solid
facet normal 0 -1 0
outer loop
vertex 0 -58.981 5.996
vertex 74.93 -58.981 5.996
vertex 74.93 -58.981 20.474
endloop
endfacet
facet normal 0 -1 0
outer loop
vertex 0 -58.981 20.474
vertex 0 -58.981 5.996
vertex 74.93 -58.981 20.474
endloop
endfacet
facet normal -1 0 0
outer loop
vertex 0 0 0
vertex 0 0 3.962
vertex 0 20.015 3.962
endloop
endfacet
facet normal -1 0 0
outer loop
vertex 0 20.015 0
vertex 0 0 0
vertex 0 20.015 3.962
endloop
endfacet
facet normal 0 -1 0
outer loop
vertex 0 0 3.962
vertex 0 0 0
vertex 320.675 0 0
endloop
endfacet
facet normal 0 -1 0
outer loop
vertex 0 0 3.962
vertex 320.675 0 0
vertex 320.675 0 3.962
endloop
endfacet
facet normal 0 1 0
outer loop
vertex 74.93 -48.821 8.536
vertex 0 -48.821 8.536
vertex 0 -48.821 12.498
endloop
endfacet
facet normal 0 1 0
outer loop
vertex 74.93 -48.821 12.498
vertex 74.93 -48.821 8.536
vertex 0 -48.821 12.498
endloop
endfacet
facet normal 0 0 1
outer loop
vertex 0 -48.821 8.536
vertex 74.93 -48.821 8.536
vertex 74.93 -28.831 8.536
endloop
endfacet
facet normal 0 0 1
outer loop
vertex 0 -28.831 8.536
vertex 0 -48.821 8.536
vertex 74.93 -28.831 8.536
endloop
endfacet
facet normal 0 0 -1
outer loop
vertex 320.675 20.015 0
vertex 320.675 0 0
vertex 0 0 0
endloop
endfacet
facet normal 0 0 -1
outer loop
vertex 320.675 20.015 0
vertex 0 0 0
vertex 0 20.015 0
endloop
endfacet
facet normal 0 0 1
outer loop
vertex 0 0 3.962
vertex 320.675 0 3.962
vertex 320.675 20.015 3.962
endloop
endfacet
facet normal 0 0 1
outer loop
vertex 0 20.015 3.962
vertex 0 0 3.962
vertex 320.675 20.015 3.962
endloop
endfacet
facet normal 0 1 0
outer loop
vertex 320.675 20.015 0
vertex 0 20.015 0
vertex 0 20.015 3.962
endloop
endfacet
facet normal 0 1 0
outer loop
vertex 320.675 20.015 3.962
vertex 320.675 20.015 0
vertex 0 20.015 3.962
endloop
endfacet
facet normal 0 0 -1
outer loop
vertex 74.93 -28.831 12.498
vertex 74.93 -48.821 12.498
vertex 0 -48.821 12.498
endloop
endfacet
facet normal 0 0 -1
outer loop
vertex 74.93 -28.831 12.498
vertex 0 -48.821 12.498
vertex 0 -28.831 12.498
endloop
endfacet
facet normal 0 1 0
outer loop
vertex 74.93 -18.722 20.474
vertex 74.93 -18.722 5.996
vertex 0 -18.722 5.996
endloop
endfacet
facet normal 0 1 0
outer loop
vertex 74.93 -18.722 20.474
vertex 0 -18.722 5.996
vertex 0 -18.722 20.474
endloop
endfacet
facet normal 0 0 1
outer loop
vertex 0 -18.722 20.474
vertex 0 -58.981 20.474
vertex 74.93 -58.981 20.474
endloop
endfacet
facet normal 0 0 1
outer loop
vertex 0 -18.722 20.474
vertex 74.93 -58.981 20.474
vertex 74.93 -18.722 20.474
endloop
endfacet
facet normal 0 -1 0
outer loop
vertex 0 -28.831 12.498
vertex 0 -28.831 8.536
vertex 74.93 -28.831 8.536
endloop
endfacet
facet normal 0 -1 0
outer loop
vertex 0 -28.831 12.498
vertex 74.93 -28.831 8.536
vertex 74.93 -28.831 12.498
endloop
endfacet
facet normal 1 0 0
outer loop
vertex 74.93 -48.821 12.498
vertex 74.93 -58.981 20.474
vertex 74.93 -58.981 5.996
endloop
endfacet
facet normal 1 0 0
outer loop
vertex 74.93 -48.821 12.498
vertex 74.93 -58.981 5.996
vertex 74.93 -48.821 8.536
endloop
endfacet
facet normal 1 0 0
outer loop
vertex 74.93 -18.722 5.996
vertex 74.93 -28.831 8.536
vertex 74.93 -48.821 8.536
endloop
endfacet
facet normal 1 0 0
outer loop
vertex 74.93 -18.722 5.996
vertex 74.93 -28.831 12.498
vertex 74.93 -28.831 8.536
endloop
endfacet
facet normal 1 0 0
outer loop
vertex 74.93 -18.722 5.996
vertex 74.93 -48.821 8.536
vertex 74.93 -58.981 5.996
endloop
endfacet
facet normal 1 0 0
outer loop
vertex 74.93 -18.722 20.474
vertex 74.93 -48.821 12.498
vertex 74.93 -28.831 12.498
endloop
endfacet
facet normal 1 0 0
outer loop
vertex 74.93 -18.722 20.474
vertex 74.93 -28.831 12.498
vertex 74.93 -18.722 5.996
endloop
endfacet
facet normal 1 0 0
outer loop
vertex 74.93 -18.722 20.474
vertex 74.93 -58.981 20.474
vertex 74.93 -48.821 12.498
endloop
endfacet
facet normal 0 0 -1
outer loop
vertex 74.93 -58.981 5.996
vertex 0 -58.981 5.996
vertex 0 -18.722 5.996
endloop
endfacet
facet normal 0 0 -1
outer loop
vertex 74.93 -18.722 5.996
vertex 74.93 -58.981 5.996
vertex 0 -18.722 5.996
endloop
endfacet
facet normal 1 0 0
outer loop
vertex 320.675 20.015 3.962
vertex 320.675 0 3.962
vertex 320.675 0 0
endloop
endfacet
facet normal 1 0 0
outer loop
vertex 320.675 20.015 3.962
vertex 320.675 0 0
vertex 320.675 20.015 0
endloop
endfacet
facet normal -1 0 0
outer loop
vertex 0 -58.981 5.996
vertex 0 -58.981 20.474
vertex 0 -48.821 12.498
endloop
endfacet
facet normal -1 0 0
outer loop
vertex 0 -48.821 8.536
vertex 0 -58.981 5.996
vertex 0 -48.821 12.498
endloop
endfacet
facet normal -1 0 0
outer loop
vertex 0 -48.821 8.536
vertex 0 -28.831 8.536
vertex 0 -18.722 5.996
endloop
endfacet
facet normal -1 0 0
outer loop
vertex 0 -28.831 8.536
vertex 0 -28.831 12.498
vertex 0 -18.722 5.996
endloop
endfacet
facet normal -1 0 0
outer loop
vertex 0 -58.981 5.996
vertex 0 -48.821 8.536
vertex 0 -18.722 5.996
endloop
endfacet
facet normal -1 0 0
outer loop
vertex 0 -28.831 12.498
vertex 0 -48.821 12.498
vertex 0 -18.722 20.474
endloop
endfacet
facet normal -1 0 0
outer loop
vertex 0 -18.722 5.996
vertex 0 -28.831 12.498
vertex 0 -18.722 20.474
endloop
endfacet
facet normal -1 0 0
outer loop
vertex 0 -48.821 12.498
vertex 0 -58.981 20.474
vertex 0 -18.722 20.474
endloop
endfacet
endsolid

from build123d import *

# Parameters (mm, degrees)
F0_W     = 20.0152
F0_H     = 3.9624
F1_DEPTH = 320.675
F2_W     = 40.259
F2_H     = 14.478
F2_W_2   = 19.9898
F2_H_2   = 3.9624
F3_DEPTH = 74.93


with BuildPart() as f1:
    # F0 (on Right) → F1 (new body)
    with BuildSketch(Plane.YZ):
        with Locations((10.0076, 1.9812)):
            Rectangle(F0_W, F0_H)
    extrude(amount=F1_DEPTH)


with BuildPart() as f3:
    # F2 (on Right) → F3 (new body)
    with BuildSketch(Plane.YZ):
        with Locations((-38.851005, 13.23496)):
            Rectangle(F2_W, F2_H)
        with Locations((-38.825605, 10.51716)):
            Rectangle(F2_W_2, F2_H_2, mode=Mode.SUBTRACT)
    extrude(amount=F3_DEPTH)


solid = Compound([f1.part, f3.part])
